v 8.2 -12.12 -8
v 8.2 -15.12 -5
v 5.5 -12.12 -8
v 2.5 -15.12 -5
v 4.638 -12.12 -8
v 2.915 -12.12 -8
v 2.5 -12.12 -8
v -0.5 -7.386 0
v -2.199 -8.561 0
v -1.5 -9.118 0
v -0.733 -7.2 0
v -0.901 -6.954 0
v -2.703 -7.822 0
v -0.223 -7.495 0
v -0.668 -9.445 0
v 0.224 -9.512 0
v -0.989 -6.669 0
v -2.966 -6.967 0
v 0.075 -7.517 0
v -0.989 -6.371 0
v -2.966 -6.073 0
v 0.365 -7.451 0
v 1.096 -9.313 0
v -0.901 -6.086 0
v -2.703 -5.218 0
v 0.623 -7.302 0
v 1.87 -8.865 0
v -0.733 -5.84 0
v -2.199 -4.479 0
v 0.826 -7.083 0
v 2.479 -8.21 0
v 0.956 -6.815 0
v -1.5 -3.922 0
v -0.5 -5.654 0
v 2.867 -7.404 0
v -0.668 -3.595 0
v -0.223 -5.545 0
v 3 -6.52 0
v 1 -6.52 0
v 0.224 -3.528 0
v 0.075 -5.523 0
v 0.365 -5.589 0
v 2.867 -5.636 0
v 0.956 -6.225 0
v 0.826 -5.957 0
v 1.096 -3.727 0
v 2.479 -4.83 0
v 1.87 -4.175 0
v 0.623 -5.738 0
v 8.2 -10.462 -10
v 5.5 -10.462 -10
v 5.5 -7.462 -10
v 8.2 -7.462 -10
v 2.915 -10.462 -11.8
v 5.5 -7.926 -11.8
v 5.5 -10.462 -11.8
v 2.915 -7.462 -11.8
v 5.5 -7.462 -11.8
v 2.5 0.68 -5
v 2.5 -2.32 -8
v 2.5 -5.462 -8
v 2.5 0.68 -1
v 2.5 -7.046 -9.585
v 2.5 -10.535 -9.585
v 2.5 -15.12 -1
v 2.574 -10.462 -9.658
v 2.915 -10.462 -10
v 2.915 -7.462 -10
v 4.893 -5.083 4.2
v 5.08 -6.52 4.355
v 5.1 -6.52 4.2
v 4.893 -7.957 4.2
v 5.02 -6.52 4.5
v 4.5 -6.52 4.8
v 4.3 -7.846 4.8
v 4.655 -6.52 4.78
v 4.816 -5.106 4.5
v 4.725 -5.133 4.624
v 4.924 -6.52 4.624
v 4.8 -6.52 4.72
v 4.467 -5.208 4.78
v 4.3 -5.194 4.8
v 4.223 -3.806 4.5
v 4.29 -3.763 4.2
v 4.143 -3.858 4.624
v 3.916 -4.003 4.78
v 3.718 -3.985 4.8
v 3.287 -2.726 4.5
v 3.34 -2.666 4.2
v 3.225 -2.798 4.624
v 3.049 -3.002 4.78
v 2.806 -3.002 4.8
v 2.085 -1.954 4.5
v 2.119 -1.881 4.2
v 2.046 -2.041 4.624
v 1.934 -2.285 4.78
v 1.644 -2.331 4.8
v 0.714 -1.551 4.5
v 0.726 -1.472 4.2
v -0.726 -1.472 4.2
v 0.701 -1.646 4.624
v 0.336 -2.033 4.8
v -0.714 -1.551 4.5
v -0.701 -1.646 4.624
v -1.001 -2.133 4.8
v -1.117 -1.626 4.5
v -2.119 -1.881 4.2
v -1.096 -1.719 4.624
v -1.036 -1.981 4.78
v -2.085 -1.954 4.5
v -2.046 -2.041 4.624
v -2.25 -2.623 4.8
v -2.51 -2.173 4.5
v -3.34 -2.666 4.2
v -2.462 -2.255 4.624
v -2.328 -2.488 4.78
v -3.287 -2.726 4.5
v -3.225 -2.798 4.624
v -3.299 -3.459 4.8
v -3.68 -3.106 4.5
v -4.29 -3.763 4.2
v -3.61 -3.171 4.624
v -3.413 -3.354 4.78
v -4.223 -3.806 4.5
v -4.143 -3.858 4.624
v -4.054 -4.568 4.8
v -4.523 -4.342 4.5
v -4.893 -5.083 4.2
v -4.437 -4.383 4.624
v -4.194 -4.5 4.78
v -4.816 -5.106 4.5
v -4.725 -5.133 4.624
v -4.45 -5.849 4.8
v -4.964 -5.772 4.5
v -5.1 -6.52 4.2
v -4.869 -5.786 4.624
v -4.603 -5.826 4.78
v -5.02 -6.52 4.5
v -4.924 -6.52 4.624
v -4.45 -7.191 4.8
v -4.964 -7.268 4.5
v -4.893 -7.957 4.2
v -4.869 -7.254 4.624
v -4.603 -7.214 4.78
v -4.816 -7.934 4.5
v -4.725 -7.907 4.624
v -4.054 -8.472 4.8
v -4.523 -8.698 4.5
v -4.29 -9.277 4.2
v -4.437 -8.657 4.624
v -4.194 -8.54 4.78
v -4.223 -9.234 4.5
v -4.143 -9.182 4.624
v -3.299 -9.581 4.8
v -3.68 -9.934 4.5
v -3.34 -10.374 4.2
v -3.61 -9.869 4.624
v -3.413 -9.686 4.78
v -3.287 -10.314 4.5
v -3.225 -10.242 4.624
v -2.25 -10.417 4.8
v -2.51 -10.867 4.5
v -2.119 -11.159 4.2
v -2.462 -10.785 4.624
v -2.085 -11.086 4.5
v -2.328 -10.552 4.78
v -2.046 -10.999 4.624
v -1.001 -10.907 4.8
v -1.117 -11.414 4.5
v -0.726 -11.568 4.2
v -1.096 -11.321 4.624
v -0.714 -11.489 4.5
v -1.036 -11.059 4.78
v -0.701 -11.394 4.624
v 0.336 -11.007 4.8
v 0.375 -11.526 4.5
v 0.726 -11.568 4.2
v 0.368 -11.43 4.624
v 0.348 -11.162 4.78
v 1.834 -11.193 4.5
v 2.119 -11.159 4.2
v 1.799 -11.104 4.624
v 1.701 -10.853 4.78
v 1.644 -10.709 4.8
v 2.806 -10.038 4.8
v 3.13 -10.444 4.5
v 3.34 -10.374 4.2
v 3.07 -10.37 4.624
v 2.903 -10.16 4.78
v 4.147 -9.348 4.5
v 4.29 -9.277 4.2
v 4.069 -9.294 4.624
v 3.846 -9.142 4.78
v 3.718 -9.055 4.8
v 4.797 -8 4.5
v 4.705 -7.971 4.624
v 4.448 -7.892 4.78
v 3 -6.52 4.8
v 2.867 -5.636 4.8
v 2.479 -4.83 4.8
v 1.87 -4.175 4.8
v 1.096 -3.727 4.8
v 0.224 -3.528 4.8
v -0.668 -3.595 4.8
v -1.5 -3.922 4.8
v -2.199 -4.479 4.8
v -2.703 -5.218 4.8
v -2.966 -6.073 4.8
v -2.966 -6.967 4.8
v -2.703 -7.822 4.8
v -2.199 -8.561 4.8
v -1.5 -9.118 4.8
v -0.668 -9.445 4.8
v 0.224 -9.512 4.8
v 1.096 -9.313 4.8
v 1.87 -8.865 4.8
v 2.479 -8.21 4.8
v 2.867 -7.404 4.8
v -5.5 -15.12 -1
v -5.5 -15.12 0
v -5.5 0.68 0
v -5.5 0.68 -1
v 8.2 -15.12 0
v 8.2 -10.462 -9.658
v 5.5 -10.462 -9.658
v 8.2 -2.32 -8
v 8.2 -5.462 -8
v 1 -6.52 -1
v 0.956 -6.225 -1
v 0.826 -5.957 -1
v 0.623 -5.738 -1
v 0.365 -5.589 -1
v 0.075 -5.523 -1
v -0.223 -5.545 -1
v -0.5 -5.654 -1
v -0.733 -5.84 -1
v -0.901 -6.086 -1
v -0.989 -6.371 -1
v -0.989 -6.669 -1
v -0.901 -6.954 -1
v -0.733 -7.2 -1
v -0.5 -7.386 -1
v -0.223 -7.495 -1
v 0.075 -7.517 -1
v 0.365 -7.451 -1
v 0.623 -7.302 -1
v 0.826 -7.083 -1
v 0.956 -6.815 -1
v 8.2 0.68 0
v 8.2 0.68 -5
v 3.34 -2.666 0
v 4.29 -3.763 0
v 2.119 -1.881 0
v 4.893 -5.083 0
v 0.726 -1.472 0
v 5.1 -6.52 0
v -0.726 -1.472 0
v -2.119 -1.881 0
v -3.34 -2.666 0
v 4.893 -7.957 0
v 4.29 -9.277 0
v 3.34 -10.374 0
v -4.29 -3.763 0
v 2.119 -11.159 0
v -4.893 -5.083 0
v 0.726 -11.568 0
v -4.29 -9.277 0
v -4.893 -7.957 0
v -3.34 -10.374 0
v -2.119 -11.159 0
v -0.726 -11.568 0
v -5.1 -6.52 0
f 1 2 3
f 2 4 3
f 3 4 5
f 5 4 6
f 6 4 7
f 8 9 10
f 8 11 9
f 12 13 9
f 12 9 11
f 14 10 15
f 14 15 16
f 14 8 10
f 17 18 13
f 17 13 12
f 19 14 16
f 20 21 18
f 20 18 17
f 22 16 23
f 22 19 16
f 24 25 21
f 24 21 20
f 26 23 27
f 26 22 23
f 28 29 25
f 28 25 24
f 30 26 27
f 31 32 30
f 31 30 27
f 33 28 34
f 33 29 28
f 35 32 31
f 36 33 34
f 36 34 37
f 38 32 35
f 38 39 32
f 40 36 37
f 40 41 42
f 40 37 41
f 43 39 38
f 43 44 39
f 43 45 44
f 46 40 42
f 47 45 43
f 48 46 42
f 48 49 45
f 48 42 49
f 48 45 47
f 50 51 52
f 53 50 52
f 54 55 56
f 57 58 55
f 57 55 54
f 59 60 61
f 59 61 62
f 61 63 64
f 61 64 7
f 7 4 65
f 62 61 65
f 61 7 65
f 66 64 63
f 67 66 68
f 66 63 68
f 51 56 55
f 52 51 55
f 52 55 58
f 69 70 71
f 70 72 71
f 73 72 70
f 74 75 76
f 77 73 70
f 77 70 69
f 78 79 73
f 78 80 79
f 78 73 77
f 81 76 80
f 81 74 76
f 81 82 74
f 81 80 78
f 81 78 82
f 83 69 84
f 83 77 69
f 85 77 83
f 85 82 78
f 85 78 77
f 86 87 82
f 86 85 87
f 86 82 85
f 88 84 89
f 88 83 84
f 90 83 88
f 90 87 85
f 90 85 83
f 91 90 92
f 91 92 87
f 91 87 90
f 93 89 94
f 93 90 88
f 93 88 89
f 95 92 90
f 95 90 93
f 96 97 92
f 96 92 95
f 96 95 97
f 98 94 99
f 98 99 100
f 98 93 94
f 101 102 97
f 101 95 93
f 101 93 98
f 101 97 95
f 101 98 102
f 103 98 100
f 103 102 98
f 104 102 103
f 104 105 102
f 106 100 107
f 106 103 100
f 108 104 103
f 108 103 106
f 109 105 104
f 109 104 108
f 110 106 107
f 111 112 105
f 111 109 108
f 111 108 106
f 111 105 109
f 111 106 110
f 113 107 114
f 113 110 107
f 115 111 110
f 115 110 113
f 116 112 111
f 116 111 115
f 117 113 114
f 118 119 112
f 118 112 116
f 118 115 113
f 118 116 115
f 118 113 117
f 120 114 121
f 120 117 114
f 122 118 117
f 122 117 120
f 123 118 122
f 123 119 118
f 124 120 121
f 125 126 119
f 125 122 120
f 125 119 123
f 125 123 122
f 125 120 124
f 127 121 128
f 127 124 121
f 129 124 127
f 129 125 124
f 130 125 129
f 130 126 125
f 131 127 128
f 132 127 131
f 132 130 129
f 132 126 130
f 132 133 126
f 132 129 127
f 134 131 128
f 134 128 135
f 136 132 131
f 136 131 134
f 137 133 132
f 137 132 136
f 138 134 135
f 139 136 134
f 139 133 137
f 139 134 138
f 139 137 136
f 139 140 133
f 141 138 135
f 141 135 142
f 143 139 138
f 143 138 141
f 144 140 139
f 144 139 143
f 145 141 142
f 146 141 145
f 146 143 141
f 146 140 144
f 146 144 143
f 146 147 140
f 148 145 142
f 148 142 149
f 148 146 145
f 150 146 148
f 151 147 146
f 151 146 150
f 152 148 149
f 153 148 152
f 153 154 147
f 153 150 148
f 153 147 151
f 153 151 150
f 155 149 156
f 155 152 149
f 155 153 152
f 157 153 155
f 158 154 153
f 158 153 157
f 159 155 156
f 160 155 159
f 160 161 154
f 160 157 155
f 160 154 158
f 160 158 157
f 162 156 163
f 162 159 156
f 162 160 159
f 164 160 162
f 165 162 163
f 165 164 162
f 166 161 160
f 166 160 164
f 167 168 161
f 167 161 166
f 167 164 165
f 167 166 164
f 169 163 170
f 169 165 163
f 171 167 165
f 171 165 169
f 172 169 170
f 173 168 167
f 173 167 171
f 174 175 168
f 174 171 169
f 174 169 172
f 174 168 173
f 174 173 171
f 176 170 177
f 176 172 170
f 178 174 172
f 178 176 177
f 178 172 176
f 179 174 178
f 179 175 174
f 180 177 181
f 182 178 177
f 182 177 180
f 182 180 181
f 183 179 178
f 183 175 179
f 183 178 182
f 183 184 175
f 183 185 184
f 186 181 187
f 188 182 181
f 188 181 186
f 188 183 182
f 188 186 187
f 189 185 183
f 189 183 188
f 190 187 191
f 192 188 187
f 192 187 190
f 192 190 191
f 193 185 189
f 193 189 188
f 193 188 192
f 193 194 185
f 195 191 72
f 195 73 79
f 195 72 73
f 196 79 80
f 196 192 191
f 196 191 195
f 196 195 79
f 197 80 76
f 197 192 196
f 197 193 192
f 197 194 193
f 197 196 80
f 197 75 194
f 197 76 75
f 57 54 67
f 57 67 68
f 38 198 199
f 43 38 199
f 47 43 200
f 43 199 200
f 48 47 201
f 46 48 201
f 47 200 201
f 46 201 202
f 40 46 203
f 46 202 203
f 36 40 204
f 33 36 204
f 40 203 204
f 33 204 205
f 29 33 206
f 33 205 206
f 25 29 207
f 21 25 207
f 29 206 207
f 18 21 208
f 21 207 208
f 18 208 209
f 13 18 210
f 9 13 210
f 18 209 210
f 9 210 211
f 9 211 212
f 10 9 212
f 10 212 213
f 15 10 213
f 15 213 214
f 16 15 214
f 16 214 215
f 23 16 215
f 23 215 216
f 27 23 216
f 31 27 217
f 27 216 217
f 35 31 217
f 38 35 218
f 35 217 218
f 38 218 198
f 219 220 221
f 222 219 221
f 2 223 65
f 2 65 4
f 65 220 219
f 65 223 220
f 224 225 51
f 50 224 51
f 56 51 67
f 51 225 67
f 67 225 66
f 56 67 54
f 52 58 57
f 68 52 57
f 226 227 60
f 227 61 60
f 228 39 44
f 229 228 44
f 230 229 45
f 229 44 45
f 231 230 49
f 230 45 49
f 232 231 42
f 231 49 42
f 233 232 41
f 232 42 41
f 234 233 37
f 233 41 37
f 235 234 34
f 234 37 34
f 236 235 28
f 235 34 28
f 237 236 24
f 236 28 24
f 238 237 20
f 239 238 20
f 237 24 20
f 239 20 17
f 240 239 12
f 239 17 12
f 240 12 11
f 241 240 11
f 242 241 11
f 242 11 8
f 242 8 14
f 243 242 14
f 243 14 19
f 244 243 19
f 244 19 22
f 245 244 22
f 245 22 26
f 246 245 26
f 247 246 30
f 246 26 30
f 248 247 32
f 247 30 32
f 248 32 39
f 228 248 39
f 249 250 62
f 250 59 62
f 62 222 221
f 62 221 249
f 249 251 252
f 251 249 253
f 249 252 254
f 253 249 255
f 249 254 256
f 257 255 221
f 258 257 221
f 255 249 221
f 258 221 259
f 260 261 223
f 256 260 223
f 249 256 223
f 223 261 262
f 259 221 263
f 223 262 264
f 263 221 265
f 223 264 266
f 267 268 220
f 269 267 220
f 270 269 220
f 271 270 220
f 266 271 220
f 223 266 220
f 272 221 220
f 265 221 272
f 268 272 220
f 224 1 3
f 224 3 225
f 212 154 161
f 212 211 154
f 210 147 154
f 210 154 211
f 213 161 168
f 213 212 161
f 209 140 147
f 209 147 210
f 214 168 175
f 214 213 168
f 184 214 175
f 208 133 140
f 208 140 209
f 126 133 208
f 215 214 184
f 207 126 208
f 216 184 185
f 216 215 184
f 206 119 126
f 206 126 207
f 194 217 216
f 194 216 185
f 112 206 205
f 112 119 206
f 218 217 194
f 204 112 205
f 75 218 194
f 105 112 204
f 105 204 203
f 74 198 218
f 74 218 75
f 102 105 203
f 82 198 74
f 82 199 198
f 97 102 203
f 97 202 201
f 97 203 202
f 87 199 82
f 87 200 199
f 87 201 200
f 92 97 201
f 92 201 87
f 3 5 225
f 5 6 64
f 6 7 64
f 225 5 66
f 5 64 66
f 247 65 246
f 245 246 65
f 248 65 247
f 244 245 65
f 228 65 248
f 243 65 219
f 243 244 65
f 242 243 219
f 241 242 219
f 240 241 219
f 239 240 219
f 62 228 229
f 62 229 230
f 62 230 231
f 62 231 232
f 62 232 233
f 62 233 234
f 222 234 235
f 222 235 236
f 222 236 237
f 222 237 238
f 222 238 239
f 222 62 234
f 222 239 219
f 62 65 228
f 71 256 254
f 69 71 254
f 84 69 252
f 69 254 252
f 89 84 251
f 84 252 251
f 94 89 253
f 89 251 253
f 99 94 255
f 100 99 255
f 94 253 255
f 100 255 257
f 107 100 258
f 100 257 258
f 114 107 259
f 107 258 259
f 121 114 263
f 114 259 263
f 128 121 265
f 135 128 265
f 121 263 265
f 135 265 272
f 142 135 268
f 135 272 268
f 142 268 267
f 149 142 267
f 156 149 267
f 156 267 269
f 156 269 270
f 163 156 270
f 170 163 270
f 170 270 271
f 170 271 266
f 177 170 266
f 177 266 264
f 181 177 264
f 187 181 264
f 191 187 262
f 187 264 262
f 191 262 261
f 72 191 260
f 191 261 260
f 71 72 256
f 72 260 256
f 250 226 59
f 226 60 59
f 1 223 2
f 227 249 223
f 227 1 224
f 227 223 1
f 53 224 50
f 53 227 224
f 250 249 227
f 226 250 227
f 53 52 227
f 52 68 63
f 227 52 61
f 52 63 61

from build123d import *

# Parameters (mm, degrees)
SKETCH_3_R          = 5.1
EXTRUDE_1_DEPTH     = 4.8
SKETCH_4_W          = 11
SKETCH_4_H          = 15.8
EXTRUDE_2_DEPTH     = 1
SKETCH_5_R          = 1.5
EXTRUDE_3_DEPTH     = 10.8
CUT_EXTRUDE_1_DEPTH = 10.8
FILLET_1_R          = 0.6
SKETCH_8_R          = 3
CUT_EXTRUDE_2_DEPTH = 4.8
SKETCH_9_R          = 1
CUT_EXTRUDE_3_DEPTH = 1
SKETCH_10_W         = 3
SKETCH_10_H         = 15.8
EXTRUDE_4_DEPTH     = 7
CHAMFER_1_SIZE      = 3
SKETCH_11_W         = 2.584868303
SKETCH_11_H         = 3
EXTRUDE_5_DEPTH     = 10
CHAMFER_4_SIZE      = 1.6584
CHAMFER_5_SIZE      = 2
CHAMFER_6_SIZE      = 2
EXTRUDE_6_DEPTH     = 2.7


# Read off the part's stored shape, not the designer's step: Бобышка-Вытянуть6
with BuildPart() as part:
    # Эскиз3 → Бобышка-Вытянуть1 (new body)
    with BuildSketch(Plane.XY):
        with Locations((0, -6.52)):
            Circle(SKETCH_3_R)
    extrude(amount=EXTRUDE_1_DEPTH)

    # Эскиз4 → Бобышка-Вытянуть2 (add)
    with BuildSketch(Plane(origin=(0, 0, 0), x_dir=(-1, 0, 0), z_dir=(0, 0, -1))):
        with Locations((0, -7.22)):
            Rectangle(SKETCH_4_W, SKETCH_4_H)
    extrude(amount=EXTRUDE_2_DEPTH)

    # Эскиз5 → Бобышка-Вытянуть3 (add)
    with BuildSketch(Plane(origin=(0, 0, -1), x_dir=(-1, 0, 0), z_dir=(0, 0, -1))):
        with Locations(Location((-4.415131697, -8.961534596, 0), (0, 0, 136.323092078))):
            Circle(SKETCH_5_R)
    extrude(amount=EXTRUDE_3_DEPTH)

    # Эскиз6 → Вырез-Вытянуть1 (cut)
    with BuildSketch(Plane.XY.offset(-1)):
        with BuildLine():
            Line((5.5, -7.925648132), (5.5, -9.997421059))
            ThreePointArc((5.5, -9.997421059), (5.915131697, -8.961534596), (5.5, -7.925648132))
        make_face()
    extrude(amount=-CUT_EXTRUDE_1_DEPTH, mode=Mode.SUBTRACT)

    # Скругление1
    fillet_1_edges = [part.edges().sort_by_distance(p)[0] for p in [
        (-5.1, -6.52, 4.8),
    ]]
    fillet(fillet_1_edges, radius=FILLET_1_R)

    # Эскиз8 → Вырез-Вытянуть2 (cut)
    with BuildSketch(Plane.XY.offset(4.8)):
        with Locations((0, -6.52)):
            Circle(SKETCH_8_R)
    extrude(amount=-CUT_EXTRUDE_2_DEPTH, mode=Mode.SUBTRACT)

    # Эскиз9 → Вырез-Вытянуть3 (cut)
    with BuildSketch(Plane.XY):
        with Locations((0, -6.52)):
            Circle(SKETCH_9_R)
    extrude(amount=-CUT_EXTRUDE_3_DEPTH, mode=Mode.SUBTRACT)

    # Эскиз10 → Бобышка-Вытянуть4 (add)
    with BuildSketch(Plane(origin=(0, 0, -1), x_dir=(-1, 0, 0), z_dir=(0, 0, -1))):
        with Locations((-4, -7.22)):
            Rectangle(SKETCH_10_W, SKETCH_10_H)
    extrude(amount=EXTRUDE_4_DEPTH)

    # Фаска1
    chamfer_1_edges = [part.edges().sort_by_distance(p)[0] for p in [
        (4, -15.12, -8),
        (4, 0.68, -8),
    ]]
    chamfer(chamfer_1_edges, length=CHAMFER_1_SIZE)

    # Эскиз11 → Бобышка-Вытянуть5 (add)
    with BuildSketch(Plane(origin=(0, 0, -11.8), x_dir=(-1, 0, 0), z_dir=(0, 0, -1))):
        with Locations((-4.207565848, -8.961534596)):
            Rectangle(SKETCH_11_W, SKETCH_11_H)
    extrude(amount=-EXTRUDE_5_DEPTH)

    # Фаска4
    chamfer_4_edges = [part.edges().sort_by_distance(p)[0] for p in [
        (4.207565848, -10.461534596, -8),
    ]]
    chamfer(chamfer_4_edges, length=CHAMFER_4_SIZE)

    # Фаска5
    chamfer_5_edges = [part.edges().sort_by_distance(p)[0] for p in [
        (4.207565848, -7.461534596, -8),
    ]]
    chamfer(chamfer_5_edges, length=CHAMFER_5_SIZE)

    # Фаска6
    # the kernel refuses this chamfer: 2 mm, written as the material it adds along each edge
    with BuildSketch(Plane(origin=(2.915131697, -0.31816862, -8), x_dir=(-0.9996219169112968, 0, 0.027495876610586487), z_dir=(0, -1, 0))) as chamfer_6_piece_1_section:
        Polygon((CHAMFER_6_SIZE * 0.999621916911, CHAMFER_6_SIZE * 0.0274958766106), (-CHAMFER_6_SIZE * 0.0274958766106, CHAMFER_6_SIZE * 0.999621916911), (0, 0), align=None)
    chamfer_6_piece_1 = extrude(amount=16.945131952, mode=Mode.PRIVATE)
    chamfer_6_piece_1 = split(chamfer_6_piece_1, bisect_by=Plane(origin=(2.709078012, -6.449232398, -8.987697802), z_dir=(0, -0.7071067811865476, 0.7071067811865476)), keep=Keep.TOP, mode=Mode.PRIVATE)
    chamfer_6_piece_1 = split(chamfer_6_piece_1, bisect_by=Plane(origin=(2.709078012, -10.461534596, -8.650263736), z_dir=(0, 1, 0)), keep=Keep.TOP, mode=Mode.PRIVATE)
    chamfer_6_piece_1 = split(chamfer_6_piece_1, bisect_by=Plane(origin=(2.5, -6.786666464, -8.650263736), z_dir=(1, 0, 0)), keep=Keep.TOP, mode=Mode.PRIVATE)
    add(chamfer_6_piece_1)
    with BuildSketch(Plane(origin=(2.915131697, -0.31816862, -8), x_dir=(-0.9996219169112968, 0, 0.027495876610586487), z_dir=(0, -1, 0))) as chamfer_6_piece_2_section:
        Polygon((CHAMFER_6_SIZE * 0.999621916911, CHAMFER_6_SIZE * 0.0274958766106), (-CHAMFER_6_SIZE * 0.0274958766106, CHAMFER_6_SIZE * 0.999621916911), (0, 0), align=None)
    chamfer_6_piece_2 = extrude(amount=16.945131952, mode=Mode.PRIVATE)
    chamfer_6_piece_2 = split(chamfer_6_piece_2, bisect_by=Plane(origin=(2.70758781, -10.461534596, -8.552675921), z_dir=(0, -1, 0)), keep=Keep.TOP, mode=Mode.PRIVATE)
    chamfer_6_piece_2 = split(chamfer_6_piece_2, bisect_by=Plane(origin=(2.70758781, -11.290827655, -8.829106941), z_dir=(0, 0.7071067811865476, 0.7071067811865476)), keep=Keep.TOP, mode=Mode.PRIVATE)
    chamfer_6_piece_2 = split(chamfer_6_piece_2, bisect_by=Plane(origin=(2.5, -11.014396635, -8.552675921), z_dir=(1, 0, 0)), keep=Keep.TOP, mode=Mode.PRIVATE)
    add(chamfer_6_piece_2)

    # Бобышка-Вытянуть6 outline → Бобышка-Вытянуть6 (add)
    with BuildSketch(Plane(origin=(5.5, 0, 0), x_dir=(0, 0, -1), z_dir=(1, 0, 0))):
        Polygon((10, -7.461534596), (8, -5.461534596), (8, -2.32), (5, 0.68), (0, 0.68), (0, -15.12), (5, -15.12), (8, -12.12), (9.6584, -10.461534596), (10, -10.461534596), align=None)
    extrude(amount=EXTRUDE_6_DEPTH)


solid = part.part
